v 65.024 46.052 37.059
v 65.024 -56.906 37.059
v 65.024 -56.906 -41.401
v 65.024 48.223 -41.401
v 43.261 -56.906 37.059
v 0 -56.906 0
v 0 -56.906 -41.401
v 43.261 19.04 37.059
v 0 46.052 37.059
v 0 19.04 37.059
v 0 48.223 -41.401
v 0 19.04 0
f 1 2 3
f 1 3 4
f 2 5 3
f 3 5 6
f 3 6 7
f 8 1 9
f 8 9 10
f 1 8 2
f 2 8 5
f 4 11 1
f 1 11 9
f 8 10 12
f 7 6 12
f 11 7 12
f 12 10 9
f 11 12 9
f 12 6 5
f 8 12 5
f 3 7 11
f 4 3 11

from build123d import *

# Parameters (mm, degrees)
F1_DEPTH = 65.024
F3_DEPTH = 75.946


with BuildPart() as f1:
    # F0 (on Right) → F1 (new body)
    with BuildSketch(Plane.YZ):
        Polygon((46.052266, 37.058897), (-56.906339, 37.058897), (-56.906339, -41.400526), (48.223082, -41.400526), align=None)
    extrude(amount=F1_DEPTH)

    # F2 (on face) → F3 (cut)
    with BuildSketch(Plane.XZ.offset(56.906339)):
        Polygon((0, 0), (43.261223, 37.058897), (0, 37.058897), align=None)
    extrude(amount=-F3_DEPTH, mode=Mode.SUBTRACT)


solid = f1.part
